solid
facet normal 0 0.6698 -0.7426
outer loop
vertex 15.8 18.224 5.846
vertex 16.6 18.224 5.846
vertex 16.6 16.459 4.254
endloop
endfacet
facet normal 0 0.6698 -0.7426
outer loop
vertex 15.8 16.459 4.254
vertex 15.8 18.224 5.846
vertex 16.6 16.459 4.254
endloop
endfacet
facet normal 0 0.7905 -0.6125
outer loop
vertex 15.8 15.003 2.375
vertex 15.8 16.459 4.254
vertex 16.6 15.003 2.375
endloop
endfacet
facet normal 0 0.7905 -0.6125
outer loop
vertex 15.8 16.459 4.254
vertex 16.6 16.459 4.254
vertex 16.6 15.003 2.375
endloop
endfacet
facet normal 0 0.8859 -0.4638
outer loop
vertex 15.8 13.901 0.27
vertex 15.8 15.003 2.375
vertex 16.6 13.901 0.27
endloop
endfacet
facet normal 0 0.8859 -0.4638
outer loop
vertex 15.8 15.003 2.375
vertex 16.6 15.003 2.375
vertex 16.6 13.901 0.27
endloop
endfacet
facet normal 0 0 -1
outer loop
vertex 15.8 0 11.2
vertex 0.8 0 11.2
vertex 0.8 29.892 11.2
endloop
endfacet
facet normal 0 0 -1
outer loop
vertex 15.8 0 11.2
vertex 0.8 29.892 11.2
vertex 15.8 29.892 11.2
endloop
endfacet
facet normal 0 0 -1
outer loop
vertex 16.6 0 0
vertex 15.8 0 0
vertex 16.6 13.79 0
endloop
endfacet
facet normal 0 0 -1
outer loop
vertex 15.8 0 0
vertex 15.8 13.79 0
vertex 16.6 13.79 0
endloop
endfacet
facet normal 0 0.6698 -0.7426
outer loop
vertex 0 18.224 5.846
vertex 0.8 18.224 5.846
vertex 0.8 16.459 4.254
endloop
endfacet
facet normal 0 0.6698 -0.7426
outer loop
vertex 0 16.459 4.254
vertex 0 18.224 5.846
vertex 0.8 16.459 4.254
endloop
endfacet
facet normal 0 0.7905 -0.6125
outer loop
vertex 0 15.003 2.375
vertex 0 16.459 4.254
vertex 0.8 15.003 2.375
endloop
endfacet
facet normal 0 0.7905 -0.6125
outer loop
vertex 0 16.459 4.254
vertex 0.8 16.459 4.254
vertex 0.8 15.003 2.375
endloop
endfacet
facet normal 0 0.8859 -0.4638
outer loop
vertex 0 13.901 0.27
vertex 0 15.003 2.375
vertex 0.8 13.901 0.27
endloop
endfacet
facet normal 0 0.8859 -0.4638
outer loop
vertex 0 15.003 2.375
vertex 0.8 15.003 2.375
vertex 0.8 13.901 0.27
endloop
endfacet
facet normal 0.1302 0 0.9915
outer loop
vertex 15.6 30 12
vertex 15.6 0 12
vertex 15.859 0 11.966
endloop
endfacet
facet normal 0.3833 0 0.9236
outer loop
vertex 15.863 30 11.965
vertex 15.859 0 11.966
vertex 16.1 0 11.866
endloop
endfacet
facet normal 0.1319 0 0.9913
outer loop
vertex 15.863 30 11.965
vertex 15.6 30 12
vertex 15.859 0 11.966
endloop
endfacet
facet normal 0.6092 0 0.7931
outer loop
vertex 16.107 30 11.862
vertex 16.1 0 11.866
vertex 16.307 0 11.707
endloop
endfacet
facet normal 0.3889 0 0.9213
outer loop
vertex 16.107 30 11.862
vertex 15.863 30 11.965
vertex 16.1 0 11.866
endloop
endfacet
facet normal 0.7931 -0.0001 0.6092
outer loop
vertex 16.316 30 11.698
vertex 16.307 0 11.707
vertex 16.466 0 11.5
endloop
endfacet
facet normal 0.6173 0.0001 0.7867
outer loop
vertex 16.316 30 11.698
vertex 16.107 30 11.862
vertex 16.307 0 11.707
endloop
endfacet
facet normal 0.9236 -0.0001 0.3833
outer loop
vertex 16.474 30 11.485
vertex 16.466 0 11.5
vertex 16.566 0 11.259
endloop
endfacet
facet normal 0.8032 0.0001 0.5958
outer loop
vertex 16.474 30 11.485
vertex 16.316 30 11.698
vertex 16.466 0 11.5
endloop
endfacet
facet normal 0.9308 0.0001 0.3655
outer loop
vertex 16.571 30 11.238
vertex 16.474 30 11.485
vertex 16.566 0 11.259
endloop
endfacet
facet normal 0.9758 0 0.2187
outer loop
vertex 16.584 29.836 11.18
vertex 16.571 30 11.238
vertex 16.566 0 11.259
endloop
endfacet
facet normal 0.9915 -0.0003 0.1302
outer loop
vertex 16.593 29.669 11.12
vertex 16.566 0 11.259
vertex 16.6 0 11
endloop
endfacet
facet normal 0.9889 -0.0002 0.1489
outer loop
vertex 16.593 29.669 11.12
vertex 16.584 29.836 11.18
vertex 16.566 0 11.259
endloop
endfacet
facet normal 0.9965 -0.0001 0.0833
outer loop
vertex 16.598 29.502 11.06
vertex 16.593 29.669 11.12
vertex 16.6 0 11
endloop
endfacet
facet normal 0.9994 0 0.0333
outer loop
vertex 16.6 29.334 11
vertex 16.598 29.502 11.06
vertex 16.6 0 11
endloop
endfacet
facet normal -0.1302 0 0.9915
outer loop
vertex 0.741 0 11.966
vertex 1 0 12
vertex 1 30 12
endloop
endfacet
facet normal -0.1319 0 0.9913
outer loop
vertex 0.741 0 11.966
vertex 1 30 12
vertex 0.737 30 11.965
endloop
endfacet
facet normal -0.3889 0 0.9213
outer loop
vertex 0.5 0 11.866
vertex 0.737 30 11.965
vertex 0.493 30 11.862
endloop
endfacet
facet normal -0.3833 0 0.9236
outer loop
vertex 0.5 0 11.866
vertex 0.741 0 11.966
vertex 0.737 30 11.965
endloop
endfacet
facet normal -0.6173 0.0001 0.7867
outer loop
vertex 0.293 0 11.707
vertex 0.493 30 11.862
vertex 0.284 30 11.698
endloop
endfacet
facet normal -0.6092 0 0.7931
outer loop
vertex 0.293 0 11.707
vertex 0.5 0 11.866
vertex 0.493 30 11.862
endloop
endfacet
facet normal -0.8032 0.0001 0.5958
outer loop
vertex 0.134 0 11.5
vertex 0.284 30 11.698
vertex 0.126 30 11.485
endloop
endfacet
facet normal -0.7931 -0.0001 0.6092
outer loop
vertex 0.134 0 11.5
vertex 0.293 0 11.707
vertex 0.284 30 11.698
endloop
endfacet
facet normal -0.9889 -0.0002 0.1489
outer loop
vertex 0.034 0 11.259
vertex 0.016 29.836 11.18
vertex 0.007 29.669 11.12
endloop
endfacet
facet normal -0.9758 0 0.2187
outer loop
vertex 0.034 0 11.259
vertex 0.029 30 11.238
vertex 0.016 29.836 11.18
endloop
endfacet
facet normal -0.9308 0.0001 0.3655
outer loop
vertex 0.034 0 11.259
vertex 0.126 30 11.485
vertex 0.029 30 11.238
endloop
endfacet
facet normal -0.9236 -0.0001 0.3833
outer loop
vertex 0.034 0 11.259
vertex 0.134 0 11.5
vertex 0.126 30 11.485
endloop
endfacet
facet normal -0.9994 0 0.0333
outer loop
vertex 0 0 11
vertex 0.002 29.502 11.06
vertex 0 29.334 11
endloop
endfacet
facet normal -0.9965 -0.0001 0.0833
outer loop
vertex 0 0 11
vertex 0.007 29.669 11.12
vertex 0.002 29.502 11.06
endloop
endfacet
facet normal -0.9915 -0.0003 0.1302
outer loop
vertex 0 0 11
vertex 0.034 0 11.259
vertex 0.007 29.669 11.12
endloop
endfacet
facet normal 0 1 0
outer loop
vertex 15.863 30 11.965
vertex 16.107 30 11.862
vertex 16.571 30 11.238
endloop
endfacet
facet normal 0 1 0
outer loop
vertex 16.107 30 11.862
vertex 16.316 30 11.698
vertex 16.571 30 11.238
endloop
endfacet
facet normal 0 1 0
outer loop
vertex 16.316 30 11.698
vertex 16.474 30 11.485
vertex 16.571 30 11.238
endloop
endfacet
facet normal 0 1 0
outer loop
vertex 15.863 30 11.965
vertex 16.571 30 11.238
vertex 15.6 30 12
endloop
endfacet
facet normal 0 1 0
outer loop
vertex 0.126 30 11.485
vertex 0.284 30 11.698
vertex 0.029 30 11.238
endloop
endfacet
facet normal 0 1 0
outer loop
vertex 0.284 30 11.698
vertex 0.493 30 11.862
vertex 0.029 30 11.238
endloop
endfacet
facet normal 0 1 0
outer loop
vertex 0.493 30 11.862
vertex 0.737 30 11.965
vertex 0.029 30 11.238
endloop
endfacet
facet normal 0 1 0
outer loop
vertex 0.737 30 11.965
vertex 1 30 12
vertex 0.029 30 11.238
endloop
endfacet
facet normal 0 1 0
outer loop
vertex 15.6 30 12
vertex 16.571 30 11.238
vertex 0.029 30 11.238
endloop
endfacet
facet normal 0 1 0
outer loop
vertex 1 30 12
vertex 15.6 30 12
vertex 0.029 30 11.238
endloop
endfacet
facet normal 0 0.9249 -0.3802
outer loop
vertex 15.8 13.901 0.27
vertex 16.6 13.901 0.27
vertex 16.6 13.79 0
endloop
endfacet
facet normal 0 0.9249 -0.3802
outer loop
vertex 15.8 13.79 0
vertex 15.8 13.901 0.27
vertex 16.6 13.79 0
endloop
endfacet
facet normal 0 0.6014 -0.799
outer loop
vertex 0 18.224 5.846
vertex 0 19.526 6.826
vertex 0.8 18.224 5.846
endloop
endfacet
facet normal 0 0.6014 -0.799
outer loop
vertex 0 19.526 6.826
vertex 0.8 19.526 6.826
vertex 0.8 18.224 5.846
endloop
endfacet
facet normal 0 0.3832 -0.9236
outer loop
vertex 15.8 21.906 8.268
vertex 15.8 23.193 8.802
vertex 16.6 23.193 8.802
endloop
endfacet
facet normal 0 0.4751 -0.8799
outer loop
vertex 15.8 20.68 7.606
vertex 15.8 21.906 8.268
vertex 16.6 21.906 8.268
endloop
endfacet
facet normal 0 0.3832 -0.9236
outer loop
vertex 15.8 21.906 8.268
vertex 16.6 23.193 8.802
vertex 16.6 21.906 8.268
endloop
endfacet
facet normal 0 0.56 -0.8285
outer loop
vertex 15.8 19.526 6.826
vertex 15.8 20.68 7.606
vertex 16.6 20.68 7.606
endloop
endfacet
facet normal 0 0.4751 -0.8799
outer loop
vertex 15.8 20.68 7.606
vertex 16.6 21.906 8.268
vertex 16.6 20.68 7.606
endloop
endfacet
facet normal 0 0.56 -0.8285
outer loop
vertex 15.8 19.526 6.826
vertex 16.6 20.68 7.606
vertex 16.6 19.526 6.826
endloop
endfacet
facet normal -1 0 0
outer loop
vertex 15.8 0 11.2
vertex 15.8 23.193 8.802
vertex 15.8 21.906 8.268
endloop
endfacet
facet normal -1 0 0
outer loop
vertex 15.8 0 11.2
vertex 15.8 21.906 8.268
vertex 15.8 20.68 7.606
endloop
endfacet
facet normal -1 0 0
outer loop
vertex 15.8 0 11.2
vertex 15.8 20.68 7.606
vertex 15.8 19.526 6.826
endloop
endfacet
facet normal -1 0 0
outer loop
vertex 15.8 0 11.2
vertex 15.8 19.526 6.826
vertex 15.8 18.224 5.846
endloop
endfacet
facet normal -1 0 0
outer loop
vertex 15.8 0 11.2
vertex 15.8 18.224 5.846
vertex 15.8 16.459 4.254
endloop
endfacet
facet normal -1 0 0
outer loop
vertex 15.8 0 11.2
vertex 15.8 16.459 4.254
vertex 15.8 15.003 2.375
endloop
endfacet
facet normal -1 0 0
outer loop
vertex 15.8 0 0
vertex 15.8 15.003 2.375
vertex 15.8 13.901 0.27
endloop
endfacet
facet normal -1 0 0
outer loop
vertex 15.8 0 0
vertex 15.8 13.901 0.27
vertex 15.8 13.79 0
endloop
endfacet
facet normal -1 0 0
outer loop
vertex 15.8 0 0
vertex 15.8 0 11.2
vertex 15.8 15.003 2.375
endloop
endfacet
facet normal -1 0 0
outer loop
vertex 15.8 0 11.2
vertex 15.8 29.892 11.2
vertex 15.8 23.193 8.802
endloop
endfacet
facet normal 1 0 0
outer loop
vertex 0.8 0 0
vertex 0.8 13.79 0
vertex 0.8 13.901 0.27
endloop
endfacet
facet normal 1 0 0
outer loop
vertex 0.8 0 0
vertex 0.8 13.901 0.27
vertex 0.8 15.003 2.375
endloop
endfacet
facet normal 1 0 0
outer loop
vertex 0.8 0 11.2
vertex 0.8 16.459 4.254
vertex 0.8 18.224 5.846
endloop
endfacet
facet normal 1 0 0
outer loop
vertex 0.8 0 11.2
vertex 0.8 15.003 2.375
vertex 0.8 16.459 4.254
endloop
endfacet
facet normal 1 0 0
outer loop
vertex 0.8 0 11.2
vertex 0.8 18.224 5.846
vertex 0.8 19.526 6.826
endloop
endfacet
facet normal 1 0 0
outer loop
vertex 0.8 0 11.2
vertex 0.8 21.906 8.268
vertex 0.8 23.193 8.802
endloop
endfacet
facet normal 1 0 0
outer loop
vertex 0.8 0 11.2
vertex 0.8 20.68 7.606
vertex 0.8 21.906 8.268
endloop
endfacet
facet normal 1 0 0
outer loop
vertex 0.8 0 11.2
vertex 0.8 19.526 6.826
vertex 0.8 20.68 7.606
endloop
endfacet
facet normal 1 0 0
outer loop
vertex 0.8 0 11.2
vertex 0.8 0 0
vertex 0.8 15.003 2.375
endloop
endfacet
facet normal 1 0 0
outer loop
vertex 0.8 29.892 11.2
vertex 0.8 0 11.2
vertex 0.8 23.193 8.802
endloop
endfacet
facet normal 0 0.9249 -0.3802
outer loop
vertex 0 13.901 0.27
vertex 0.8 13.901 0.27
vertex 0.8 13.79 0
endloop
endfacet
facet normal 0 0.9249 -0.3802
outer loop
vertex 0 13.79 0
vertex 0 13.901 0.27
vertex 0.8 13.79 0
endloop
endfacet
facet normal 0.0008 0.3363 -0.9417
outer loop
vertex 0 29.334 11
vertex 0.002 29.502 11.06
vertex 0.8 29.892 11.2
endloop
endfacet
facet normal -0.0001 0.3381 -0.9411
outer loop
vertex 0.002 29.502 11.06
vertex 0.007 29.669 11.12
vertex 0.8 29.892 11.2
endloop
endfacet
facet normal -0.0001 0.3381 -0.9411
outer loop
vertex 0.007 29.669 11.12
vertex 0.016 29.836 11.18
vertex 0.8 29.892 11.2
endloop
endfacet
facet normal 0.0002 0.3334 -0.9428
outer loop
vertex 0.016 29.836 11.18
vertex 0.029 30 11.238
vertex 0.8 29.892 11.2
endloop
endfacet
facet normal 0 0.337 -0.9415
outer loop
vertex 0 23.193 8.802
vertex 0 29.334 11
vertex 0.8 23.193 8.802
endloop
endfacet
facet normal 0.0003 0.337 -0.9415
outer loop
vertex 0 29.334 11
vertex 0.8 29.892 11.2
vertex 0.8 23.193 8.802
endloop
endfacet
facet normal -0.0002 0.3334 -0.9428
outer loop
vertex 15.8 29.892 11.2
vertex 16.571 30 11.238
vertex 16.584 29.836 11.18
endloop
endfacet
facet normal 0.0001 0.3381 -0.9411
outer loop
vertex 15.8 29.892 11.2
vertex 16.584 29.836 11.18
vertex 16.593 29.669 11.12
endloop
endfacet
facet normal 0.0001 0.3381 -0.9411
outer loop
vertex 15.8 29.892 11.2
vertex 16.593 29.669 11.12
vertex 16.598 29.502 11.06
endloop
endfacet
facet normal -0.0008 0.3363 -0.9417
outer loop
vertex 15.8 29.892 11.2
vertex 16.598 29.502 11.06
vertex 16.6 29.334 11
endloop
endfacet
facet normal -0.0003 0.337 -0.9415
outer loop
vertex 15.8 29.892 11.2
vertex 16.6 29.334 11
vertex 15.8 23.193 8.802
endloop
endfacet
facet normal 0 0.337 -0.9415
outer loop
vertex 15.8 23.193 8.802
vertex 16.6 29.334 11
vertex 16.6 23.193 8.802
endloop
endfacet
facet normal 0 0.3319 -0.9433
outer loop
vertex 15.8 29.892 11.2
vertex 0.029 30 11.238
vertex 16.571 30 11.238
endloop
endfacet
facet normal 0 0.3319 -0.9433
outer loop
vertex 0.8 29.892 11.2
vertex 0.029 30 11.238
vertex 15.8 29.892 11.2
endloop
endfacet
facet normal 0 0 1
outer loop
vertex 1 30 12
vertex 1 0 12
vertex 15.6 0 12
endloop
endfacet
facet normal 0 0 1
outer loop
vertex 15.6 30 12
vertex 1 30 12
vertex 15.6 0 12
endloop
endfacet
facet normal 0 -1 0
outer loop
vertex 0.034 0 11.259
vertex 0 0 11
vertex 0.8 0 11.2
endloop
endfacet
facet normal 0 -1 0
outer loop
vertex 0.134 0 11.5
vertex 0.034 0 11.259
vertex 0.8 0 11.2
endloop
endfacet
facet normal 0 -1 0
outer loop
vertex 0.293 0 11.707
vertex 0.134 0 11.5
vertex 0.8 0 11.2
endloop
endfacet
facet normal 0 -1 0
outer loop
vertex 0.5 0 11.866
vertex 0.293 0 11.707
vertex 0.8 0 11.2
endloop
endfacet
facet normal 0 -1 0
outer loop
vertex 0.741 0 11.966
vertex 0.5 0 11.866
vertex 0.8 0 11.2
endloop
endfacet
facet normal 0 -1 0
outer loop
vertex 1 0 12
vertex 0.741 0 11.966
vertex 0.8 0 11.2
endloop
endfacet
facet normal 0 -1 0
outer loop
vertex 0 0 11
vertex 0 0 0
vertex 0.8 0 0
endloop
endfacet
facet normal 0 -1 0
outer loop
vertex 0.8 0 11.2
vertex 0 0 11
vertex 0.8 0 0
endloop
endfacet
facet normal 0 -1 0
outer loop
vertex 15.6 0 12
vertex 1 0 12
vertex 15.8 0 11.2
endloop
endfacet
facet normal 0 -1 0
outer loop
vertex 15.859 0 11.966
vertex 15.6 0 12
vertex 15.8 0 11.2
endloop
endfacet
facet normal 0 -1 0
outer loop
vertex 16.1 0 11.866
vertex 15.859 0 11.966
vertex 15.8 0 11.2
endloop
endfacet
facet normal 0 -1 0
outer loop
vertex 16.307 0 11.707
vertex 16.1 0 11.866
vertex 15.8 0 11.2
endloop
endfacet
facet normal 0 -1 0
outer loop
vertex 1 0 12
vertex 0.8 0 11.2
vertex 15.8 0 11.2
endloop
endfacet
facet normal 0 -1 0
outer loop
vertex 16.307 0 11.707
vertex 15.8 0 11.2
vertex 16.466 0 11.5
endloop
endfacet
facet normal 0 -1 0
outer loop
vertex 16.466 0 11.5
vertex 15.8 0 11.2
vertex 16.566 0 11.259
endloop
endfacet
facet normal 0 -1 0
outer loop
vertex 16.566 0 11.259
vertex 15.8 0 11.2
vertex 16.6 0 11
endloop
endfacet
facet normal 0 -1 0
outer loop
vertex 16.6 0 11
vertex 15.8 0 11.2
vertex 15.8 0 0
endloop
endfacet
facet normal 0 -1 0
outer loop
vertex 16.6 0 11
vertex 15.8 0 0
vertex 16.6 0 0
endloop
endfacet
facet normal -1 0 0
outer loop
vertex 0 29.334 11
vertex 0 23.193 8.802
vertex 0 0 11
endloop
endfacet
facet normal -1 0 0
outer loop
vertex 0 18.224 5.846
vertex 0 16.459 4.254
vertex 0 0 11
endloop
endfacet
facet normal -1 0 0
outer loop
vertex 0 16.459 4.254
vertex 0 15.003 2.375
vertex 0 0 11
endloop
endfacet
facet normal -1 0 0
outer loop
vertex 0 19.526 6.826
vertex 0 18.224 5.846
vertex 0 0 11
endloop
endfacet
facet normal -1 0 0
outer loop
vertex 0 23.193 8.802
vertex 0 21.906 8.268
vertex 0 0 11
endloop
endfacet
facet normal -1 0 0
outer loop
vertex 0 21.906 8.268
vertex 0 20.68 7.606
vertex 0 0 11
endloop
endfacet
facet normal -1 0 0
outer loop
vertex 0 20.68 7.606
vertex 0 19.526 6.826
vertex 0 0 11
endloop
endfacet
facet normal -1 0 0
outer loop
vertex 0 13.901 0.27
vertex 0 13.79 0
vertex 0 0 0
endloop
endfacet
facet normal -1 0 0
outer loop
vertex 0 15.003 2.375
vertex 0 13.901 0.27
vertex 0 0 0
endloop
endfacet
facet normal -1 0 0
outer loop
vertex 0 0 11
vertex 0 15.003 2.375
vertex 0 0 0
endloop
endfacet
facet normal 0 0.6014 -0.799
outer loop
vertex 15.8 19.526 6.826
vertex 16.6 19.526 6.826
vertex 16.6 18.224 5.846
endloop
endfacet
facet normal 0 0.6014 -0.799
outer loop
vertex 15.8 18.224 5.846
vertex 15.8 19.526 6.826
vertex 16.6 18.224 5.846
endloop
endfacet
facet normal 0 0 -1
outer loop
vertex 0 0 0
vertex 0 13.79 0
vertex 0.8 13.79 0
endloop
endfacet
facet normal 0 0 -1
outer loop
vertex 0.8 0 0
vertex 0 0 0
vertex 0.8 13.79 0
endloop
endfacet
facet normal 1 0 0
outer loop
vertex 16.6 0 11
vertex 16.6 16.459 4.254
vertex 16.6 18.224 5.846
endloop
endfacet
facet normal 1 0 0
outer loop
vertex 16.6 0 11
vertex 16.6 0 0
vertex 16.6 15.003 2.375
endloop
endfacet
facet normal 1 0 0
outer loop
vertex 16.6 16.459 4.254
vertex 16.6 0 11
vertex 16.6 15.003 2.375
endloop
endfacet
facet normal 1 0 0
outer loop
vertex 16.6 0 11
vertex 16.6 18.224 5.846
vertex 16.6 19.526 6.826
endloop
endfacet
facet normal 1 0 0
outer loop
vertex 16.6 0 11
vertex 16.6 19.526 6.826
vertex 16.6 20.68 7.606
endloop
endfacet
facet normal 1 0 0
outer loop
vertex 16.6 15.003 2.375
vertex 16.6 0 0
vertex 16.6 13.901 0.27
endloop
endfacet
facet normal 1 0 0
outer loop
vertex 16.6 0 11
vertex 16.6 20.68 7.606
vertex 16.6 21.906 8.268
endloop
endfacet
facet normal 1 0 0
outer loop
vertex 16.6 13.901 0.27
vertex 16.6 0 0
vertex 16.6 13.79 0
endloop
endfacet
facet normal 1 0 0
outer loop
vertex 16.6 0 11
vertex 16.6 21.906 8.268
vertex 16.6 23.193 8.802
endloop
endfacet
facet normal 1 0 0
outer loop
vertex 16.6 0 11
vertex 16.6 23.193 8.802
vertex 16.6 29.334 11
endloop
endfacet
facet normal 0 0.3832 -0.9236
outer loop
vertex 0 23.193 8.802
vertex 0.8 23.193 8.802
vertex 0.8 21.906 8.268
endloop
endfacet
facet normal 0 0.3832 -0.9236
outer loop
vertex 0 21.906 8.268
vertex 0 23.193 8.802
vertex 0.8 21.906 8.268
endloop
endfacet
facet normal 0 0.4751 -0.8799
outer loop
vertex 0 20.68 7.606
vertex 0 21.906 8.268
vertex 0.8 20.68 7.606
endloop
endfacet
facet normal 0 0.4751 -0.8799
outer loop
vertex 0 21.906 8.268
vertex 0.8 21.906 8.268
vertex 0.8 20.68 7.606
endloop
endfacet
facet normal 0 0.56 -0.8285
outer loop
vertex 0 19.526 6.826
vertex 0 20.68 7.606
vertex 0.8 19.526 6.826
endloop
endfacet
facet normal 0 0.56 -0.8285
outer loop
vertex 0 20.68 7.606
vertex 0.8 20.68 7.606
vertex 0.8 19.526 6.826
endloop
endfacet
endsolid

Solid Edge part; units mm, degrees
sketch "Sketch1" plane through (0, 0, 0) normal (0, 0, 1) x (1, 0, 0)
  line L0 (16.6, 30) -> (0, 30)
  line L1 (0, 30) -> (0, 0)
  line L2 (0, 0) -> (16.6, 0)
  line L3 (16.6, 0) -> (16.6, 30)
extrude "Protrusion1" add sketch "Sketch1" along normal blind 12
sketch "Sketch2" plane through (16.6, 15, 6) normal (1, 0, 0) x (0, 1, 0)
  line L0 (4.5259, 0.8255) -> (3.2238, -0.1545)
  arc A0 (-1.0985, -5.7305) -> (3.2238, -0.1545) centre (11.2888, -10.8694) cw
  line L1 (-1.0985, -5.7305) -> (-1.2103, -6)
  line L2 (-1.2103, -6) -> (15, -6)
  line L3 (15, -6) -> (15, 5.2385)
  line L4 (15, 5.2385) -> (8.1928, 2.8024)
  arc A1 (4.5259, 0.8255) -> (8.1928, 2.8024) centre (12.8653, -10.254) cw
extrude "ScavoEstrusione_1" cut sketch "Sketch2" against normal blind 87.395
sketch "Sketch3" plane through (8.3, 0, 6) normal (0, -1, 0) x (1, 0, 0)
  line L0 (7.5, 5.2) -> (7.5, -6)
  line L1 (-7.5, -6) -> (7.5, -6)
  line L2 (-7.5, -6) -> (-7.5, 5.2)
  line L3 (-7.5, 5.2) -> (7.5, 5.2)
extrude "ScavoEstrusione_2" cut sketch "Sketch3" against normal blind 100.7883
fillet "Rotondo_1" radius 1 2 edges at (0, 15, 12) (16.6, 15, 12)
